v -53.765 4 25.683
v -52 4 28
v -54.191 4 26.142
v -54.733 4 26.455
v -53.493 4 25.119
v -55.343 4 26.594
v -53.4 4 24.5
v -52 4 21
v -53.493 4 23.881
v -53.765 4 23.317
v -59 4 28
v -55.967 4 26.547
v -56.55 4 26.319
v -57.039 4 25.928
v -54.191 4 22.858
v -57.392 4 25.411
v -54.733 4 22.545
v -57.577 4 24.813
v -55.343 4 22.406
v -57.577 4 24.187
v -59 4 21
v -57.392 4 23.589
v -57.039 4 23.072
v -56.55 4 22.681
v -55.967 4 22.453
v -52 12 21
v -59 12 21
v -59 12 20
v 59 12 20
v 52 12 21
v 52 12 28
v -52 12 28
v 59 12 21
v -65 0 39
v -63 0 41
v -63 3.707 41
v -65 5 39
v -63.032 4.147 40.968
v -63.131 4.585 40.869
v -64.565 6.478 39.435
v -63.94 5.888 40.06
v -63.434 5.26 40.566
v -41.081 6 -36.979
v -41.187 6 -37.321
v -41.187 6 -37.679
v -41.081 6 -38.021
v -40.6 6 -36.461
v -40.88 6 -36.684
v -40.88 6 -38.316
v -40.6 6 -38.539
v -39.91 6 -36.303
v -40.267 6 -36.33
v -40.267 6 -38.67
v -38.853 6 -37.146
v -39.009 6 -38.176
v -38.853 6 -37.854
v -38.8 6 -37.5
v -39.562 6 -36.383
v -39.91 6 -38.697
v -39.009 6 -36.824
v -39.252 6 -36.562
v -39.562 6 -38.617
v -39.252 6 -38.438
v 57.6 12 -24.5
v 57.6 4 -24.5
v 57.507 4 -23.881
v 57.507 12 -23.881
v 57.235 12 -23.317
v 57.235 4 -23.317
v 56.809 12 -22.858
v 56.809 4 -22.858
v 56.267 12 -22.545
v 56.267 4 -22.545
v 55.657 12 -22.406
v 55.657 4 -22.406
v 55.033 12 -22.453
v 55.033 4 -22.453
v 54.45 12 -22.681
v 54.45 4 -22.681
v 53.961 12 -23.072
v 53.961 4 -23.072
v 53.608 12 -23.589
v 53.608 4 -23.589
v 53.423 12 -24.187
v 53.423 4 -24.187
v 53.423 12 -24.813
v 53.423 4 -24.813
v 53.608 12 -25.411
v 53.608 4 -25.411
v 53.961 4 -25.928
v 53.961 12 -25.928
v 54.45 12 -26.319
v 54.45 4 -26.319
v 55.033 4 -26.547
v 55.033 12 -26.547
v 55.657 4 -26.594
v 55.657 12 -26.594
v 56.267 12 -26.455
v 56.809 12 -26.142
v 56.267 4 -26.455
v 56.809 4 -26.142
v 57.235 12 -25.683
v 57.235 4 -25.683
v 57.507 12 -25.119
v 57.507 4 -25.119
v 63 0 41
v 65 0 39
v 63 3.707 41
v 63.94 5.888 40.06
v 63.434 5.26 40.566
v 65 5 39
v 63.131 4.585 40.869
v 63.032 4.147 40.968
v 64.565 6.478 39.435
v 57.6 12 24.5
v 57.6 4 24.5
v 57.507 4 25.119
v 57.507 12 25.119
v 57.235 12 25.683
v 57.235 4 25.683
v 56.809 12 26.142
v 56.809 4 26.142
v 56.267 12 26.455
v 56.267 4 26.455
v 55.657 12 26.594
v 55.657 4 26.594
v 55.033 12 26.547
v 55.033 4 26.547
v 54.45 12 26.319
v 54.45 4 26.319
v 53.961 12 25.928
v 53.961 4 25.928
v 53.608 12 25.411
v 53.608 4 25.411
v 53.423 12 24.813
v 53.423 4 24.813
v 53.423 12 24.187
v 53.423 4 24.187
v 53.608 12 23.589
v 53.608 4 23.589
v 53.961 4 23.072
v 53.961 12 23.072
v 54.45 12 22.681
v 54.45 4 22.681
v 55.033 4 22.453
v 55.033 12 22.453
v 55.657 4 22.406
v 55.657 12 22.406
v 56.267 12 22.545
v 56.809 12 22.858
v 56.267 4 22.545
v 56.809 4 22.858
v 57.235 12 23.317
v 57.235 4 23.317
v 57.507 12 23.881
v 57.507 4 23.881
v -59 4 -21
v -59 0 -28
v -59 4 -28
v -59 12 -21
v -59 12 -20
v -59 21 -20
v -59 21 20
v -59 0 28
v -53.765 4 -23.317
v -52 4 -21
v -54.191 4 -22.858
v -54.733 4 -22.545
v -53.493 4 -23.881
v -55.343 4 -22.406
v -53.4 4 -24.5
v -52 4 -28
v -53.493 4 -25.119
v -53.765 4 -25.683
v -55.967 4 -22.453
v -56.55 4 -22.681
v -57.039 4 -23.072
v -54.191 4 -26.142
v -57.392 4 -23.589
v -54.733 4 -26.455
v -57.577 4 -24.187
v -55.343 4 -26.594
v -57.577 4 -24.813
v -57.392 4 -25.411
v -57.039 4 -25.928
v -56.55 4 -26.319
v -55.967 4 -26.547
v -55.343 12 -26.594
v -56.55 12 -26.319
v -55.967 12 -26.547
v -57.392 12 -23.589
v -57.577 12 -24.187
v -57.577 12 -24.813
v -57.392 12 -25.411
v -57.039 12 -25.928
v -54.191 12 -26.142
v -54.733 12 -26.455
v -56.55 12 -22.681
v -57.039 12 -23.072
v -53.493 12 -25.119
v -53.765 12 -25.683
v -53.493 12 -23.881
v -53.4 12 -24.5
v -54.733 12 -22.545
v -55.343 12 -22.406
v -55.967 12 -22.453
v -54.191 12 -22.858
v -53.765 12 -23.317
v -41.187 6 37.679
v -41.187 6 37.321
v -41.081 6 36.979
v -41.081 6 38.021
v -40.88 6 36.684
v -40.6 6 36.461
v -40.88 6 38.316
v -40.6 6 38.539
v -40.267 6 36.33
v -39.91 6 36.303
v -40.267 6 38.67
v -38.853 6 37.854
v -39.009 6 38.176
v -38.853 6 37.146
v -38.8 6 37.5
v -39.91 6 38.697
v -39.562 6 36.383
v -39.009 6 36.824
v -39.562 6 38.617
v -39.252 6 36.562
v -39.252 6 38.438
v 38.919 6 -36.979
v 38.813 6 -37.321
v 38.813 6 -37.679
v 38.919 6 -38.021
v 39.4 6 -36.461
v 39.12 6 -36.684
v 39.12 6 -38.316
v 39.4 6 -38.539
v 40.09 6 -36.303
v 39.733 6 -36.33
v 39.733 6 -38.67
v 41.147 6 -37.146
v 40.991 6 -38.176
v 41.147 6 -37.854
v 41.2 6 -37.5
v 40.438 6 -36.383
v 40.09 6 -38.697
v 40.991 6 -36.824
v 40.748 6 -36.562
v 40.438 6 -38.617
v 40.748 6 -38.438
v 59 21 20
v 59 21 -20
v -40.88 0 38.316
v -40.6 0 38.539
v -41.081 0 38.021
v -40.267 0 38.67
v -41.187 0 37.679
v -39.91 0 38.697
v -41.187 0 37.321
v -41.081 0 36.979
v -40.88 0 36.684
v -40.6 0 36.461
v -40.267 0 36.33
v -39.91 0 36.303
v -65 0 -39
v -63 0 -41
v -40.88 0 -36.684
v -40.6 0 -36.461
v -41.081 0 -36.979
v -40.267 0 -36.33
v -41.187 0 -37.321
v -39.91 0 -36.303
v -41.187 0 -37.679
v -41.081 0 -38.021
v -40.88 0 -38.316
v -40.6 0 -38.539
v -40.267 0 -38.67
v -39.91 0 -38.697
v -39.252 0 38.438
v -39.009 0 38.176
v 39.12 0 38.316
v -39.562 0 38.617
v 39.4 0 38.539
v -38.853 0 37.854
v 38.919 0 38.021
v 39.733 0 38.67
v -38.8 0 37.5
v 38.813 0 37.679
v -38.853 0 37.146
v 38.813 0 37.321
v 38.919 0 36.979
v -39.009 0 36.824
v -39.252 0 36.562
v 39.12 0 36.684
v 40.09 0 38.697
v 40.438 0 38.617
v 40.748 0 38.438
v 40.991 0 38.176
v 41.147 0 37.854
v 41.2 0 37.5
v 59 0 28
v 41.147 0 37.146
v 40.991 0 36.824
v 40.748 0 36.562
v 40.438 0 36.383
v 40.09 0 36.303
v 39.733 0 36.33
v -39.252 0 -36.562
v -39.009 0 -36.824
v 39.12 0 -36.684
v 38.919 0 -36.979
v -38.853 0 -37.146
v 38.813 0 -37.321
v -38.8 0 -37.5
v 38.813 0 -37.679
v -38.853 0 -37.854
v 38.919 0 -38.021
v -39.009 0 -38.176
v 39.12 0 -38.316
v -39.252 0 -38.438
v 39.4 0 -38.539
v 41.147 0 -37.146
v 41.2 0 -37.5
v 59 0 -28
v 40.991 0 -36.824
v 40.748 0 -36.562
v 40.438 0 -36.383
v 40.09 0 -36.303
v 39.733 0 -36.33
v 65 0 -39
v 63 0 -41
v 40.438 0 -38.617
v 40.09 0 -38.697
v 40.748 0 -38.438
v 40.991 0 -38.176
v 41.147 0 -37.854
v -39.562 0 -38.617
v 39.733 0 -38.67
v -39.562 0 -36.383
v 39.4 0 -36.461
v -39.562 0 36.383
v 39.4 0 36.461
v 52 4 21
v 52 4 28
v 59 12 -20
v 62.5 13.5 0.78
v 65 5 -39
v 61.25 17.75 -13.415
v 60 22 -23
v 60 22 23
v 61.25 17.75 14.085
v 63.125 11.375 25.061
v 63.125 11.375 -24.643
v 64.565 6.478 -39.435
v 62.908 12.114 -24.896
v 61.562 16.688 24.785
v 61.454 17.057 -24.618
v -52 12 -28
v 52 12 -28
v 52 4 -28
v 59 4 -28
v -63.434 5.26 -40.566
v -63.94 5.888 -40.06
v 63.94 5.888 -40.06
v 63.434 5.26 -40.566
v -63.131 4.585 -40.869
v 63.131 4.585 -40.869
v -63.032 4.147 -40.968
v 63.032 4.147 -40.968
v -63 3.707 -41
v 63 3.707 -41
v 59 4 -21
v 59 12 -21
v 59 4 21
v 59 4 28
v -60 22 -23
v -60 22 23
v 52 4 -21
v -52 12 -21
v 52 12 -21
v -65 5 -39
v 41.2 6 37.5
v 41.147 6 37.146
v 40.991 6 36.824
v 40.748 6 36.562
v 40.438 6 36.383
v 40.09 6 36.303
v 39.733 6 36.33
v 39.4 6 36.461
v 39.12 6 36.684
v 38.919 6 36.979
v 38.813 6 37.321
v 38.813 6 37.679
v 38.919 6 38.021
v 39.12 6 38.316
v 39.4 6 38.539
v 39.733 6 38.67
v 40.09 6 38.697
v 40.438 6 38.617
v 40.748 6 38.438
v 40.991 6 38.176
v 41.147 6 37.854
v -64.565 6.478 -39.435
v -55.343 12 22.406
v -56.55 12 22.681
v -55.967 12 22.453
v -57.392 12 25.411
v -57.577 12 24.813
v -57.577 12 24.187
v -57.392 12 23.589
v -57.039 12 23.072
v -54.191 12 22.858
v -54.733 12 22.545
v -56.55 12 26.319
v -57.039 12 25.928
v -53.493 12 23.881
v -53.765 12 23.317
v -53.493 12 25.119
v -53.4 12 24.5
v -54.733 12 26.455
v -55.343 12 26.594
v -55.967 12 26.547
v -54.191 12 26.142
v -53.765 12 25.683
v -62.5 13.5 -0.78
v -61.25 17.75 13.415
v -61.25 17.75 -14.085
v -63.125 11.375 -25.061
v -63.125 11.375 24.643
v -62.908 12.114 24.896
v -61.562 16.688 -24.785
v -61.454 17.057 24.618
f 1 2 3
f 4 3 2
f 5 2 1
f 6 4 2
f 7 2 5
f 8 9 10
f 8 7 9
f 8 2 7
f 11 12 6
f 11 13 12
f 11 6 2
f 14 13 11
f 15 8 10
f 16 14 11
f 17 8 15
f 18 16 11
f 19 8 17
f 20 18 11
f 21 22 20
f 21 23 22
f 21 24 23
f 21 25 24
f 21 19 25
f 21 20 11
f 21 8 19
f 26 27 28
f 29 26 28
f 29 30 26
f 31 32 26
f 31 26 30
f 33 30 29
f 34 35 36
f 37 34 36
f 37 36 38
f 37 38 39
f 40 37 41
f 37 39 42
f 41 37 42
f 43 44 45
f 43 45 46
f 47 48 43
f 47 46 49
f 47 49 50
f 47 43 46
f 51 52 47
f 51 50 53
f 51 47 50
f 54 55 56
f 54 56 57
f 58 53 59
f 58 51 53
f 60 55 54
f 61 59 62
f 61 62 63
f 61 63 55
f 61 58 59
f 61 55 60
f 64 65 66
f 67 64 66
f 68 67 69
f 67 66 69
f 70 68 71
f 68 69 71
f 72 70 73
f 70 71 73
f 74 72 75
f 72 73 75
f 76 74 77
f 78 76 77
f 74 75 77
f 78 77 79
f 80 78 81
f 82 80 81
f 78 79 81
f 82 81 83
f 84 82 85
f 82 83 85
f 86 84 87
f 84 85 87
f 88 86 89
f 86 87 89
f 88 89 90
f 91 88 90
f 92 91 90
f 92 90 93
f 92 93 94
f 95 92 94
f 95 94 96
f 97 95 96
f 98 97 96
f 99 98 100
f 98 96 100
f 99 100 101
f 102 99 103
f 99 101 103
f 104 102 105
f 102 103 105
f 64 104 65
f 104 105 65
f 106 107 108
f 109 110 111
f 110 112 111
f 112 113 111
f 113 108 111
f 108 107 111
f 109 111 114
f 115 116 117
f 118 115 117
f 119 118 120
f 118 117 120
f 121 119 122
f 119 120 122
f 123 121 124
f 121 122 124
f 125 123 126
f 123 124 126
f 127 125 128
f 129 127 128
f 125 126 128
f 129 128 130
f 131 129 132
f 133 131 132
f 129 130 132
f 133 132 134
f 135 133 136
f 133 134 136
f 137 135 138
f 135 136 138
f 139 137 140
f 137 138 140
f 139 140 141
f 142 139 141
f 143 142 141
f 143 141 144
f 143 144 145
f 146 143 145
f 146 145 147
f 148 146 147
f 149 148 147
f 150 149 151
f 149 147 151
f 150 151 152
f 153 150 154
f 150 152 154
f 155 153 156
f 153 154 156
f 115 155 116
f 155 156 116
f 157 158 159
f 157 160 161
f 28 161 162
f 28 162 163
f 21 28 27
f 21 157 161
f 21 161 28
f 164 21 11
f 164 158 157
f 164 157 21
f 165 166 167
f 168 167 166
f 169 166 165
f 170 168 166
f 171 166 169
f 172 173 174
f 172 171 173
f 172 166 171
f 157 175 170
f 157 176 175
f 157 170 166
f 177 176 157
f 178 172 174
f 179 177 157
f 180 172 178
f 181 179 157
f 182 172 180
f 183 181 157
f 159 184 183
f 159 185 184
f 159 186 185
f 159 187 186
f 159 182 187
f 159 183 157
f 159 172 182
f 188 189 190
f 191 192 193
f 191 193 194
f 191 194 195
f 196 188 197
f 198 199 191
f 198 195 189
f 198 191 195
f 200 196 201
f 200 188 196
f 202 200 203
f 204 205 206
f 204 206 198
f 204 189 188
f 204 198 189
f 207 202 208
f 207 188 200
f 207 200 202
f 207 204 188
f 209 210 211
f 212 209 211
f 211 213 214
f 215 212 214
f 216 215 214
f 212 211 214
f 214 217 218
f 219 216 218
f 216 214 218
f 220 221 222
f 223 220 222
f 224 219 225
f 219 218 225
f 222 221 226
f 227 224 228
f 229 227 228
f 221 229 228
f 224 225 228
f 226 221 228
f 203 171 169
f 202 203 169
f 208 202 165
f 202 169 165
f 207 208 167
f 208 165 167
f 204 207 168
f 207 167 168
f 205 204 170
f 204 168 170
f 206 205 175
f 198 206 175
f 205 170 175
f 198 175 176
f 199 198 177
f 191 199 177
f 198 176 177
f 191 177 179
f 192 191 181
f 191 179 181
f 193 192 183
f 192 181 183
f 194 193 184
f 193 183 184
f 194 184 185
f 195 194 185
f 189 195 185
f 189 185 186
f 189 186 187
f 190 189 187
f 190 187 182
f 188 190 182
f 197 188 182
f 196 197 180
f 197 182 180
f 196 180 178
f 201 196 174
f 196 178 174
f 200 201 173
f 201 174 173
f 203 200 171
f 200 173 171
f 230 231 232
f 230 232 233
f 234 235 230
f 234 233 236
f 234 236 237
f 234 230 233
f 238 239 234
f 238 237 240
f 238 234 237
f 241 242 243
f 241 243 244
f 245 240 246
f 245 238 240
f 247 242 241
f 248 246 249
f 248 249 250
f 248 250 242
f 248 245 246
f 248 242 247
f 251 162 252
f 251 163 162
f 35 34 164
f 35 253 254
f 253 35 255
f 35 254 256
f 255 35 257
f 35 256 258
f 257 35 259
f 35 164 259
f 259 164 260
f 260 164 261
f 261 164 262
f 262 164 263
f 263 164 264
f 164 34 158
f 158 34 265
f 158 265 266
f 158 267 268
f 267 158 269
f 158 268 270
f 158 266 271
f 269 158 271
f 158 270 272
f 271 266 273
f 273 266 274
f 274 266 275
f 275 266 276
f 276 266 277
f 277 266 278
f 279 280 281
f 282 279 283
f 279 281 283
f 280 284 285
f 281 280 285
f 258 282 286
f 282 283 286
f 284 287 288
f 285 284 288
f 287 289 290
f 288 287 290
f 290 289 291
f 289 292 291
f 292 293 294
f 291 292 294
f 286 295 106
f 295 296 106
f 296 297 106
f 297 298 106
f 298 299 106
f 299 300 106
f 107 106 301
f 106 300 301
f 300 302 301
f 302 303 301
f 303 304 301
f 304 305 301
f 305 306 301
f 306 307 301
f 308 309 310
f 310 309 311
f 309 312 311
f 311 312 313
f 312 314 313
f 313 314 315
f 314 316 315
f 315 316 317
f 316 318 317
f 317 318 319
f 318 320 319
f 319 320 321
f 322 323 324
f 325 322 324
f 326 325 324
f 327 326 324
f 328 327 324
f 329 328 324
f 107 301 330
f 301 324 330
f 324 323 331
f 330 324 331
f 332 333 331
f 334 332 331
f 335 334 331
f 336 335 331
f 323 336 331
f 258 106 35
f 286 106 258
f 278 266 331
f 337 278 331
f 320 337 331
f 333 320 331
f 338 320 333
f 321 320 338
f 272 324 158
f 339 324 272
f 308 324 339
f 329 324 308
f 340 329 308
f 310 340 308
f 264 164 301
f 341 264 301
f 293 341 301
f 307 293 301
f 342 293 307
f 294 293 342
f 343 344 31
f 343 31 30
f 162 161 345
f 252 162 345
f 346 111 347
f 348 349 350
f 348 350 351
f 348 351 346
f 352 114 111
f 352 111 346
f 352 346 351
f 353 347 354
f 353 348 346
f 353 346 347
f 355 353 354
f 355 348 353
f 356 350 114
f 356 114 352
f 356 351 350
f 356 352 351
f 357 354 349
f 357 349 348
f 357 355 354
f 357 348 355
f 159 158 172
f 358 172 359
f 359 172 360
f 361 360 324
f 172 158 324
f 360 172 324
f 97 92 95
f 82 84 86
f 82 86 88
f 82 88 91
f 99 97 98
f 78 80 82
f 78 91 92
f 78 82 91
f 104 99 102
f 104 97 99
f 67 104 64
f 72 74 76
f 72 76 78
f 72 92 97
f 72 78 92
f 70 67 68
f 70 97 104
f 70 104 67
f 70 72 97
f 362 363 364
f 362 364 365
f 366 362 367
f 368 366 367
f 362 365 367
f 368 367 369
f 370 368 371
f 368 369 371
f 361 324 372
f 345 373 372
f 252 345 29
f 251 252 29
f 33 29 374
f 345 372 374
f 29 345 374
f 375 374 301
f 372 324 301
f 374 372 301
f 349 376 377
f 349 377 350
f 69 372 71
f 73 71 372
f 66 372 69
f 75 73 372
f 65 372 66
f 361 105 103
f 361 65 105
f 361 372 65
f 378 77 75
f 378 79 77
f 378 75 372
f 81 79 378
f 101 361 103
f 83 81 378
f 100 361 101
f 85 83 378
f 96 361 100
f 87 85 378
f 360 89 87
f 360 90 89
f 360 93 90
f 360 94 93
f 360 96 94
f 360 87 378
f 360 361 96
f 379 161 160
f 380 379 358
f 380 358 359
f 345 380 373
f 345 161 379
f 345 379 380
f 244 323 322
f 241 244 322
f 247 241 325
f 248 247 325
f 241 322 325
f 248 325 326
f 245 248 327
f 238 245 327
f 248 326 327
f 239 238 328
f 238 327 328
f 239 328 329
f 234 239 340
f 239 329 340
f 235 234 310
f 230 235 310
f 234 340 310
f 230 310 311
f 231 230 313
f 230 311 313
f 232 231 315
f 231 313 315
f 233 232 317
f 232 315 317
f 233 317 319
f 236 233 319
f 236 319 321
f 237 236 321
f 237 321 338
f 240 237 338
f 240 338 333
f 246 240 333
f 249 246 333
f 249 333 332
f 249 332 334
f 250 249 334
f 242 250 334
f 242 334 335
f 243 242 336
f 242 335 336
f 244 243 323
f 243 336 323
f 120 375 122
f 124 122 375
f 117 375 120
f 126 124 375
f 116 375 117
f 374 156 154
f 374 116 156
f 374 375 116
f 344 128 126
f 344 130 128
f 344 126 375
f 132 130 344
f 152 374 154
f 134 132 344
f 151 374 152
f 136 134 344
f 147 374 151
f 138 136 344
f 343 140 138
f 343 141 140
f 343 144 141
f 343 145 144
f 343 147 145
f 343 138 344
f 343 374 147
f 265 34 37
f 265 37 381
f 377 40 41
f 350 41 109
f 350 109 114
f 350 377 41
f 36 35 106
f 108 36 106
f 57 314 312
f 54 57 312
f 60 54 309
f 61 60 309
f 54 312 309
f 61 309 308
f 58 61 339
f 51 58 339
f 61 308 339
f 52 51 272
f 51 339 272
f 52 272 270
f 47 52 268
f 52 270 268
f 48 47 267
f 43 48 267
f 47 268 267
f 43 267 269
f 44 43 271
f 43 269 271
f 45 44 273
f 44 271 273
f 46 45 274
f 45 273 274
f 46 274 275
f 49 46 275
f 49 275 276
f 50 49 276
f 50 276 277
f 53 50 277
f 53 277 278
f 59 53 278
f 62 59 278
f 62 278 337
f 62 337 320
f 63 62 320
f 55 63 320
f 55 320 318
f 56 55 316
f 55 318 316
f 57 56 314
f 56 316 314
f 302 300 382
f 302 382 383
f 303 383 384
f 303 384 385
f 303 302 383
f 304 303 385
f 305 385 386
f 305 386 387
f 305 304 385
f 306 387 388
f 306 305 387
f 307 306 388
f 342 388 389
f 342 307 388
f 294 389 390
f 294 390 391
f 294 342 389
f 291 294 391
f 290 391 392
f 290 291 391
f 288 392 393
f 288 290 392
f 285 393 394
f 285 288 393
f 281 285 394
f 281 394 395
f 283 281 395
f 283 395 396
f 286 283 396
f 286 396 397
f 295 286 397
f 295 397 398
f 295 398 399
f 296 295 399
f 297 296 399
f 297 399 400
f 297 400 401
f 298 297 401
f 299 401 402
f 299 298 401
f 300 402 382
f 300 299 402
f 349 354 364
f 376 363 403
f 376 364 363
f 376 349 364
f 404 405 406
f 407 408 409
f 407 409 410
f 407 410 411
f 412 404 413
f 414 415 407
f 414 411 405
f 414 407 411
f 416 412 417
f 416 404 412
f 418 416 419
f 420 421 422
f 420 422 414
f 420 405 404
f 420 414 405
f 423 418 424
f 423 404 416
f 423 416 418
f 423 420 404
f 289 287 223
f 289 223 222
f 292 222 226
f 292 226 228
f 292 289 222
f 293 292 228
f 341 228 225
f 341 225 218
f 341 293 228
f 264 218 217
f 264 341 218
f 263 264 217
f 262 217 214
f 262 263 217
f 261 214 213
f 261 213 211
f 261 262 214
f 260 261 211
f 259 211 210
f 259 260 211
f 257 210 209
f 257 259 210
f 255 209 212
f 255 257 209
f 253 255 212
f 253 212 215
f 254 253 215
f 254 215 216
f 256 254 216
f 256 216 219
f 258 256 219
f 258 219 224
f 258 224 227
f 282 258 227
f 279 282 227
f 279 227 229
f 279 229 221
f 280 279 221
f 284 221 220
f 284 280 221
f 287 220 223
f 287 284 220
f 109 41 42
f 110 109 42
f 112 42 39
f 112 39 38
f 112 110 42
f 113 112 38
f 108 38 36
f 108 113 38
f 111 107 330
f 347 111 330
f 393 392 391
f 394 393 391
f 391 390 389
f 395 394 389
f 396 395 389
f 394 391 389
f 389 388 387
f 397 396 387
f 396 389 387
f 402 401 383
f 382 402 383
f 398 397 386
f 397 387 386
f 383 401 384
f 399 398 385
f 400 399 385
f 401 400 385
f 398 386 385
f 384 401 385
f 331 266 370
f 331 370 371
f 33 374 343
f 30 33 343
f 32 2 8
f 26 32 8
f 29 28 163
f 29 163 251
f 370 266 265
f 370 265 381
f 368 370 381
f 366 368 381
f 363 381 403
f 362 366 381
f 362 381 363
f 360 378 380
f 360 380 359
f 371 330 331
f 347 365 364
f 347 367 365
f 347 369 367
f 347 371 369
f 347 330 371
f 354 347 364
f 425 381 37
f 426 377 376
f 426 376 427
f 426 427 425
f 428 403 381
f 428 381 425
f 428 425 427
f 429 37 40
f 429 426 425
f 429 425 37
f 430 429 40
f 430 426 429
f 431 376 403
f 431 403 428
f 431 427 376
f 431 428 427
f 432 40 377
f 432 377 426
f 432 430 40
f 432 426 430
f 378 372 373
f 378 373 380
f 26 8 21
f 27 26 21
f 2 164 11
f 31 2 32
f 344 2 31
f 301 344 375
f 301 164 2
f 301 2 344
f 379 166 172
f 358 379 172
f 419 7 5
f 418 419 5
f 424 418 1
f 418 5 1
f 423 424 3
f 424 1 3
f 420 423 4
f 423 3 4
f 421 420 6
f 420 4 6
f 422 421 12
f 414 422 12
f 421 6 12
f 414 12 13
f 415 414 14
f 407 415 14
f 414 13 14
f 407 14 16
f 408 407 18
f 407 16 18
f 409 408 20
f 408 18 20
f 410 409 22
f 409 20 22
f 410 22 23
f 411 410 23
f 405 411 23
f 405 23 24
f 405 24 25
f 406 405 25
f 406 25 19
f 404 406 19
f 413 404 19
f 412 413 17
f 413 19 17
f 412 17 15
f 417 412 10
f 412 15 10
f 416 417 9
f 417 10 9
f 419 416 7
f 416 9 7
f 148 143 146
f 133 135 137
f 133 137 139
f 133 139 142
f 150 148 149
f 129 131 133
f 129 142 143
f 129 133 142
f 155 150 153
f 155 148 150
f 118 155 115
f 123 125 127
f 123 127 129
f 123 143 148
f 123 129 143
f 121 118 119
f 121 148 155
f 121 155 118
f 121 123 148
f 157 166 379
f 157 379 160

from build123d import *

# Parameters (mm, degrees)
SKETCH1_W           = 130
SKETCH1_H           = 82
BOSS_EXTRUDE1_DEPTH = 5
SKETCH3_W           = 130
SKETCH3_H           = 82
SKETCH2_W           = 120
SKETCH2_H           = 46
CHAMFER1_SIZE       = 2
SKETCH4_R           = 1.2
CUT_EXTRUDE1_DEPTH  = 6
SKETCH5_W           = 114
SKETCH5_H           = 40
CUT_EXTRUDE2_DEPTH  = 21
SKETCH6_W           = 118
SKETCH6_H           = 56
CUT_EXTRUDE3_DEPTH  = 12
SKETCH8_W           = 7
SKETCH8_H           = 7
BOSS_EXTRUDE2_DEPTH = 8
SKETCH9_R           = 2.1
CUT_EXTRUDE4_DEPTH  = 8
SKETCH10_W          = 2
SKETCH10_H          = 40
CUT_EXTRUDE5_DEPTH  = 9
FILLET1_R           = 3


with BuildPart() as part:
    # Sketch1 → Boss-Extrude1 (new body)
    with BuildSketch(Plane(origin=(0, 0, 0), x_dir=(1, 0, 0), z_dir=(0, 1, 0))):
        Rectangle(SKETCH1_W, SKETCH1_H)
    extrude(amount=BOSS_EXTRUDE1_DEPTH)

    # Sketch3 → Loft2 section 0
    with BuildSketch(Plane(origin=(0, 5, 0), x_dir=(1, 0, 0), z_dir=(0, 1, 0))):
        Rectangle(SKETCH3_W, SKETCH3_H)
    # Sketch2 → Loft2 section 1
    with BuildSketch(Plane(origin=(0, 22, 0), x_dir=(1, 0, 0), z_dir=(0, 1, 0))):
        Rectangle(SKETCH2_W, SKETCH2_H)
    loft()

    # Chamfer1
    chamfer1_edges = [part.edges().sort_by_distance(p)[0] for p in [
        (-65, 2.5, 41),
        (65, 2.5, 41),
        (65, 2.5, -41),
        (-65, 2.5, -41),
    ]]
    chamfer(chamfer1_edges, length=CHAMFER1_SIZE)

    # Sketch4 → Cut-Extrude1 (cut)
    with BuildSketch(Plane.XZ):
        with Locations((40, -37.5)):
            Circle(SKETCH4_R)
        with Locations((-40, -37.5)):
            Circle(SKETCH4_R)
    cut_extrude1 = extrude(amount=-CUT_EXTRUDE1_DEPTH, mode=Mode.SUBTRACT)

    # Sketch5 → Cut-Extrude2 (cut)
    with BuildSketch(Plane.XZ):
        Rectangle(SKETCH5_W, SKETCH5_H)
    extrude(amount=-CUT_EXTRUDE2_DEPTH, mode=Mode.SUBTRACT)

    # Mirror1: Cut-Extrude1 across plane
    add(cut_extrude1.mirror(Plane.XY), mode=Mode.SUBTRACT)

    # Sketch6 → Cut-Extrude3 (cut)
    with BuildSketch(Plane.XZ):
        Rectangle(SKETCH6_W, SKETCH6_H)
    extrude(amount=-CUT_EXTRUDE3_DEPTH, mode=Mode.SUBTRACT)

    # Sketch8 → Boss-Extrude2 (add)
    with BuildSketch(Plane(origin=(0, 4, 0), x_dir=(-1, 0, 0), z_dir=(0, -1, 0))):
        with Locations((-55.5, 24.5)):
            Rectangle(SKETCH8_W, SKETCH8_H)
        with Locations((-55.5, -24.5)):
            Rectangle(SKETCH8_W, SKETCH8_H)
        with Locations((55.5, -24.5)):
            Rectangle(SKETCH8_W, SKETCH8_H)
        with Locations((55.5, 24.5)):
            Rectangle(SKETCH8_W, SKETCH8_H)
    extrude(amount=-BOSS_EXTRUDE2_DEPTH)

    # Sketch9 → Cut-Extrude4 (cut)
    with BuildSketch(Plane.XZ.offset(-4)):
        with Locations((-55.5, 24.5)):
            Circle(SKETCH9_R)
        with Locations((55.5, 24.5)):
            Circle(SKETCH9_R)
        with Locations((55.5, -24.5)):
            Circle(SKETCH9_R)
        with Locations((-55.5, -24.5)):
            Circle(SKETCH9_R)
    extrude(amount=-CUT_EXTRUDE4_DEPTH, mode=Mode.SUBTRACT)

    # Sketch10 → Cut-Extrude5 (cut)
    with BuildSketch(Plane.XZ.offset(-12)):
        with Locations((-58, 0)):
            Rectangle(SKETCH10_W, SKETCH10_H)
        with Locations((58, 0)):
            Rectangle(SKETCH10_W, SKETCH10_H)
    extrude(amount=-CUT_EXTRUDE5_DEPTH, mode=Mode.SUBTRACT)

    # Fillet1
    fillet1_edges = [part.edges().sort_by_distance(p)[0] for p in [
        (0, 5, 41),
        (0, 5, -41),
    ]]
    fillet(fillet1_edges, radius=FILLET1_R)


solid = part.part
